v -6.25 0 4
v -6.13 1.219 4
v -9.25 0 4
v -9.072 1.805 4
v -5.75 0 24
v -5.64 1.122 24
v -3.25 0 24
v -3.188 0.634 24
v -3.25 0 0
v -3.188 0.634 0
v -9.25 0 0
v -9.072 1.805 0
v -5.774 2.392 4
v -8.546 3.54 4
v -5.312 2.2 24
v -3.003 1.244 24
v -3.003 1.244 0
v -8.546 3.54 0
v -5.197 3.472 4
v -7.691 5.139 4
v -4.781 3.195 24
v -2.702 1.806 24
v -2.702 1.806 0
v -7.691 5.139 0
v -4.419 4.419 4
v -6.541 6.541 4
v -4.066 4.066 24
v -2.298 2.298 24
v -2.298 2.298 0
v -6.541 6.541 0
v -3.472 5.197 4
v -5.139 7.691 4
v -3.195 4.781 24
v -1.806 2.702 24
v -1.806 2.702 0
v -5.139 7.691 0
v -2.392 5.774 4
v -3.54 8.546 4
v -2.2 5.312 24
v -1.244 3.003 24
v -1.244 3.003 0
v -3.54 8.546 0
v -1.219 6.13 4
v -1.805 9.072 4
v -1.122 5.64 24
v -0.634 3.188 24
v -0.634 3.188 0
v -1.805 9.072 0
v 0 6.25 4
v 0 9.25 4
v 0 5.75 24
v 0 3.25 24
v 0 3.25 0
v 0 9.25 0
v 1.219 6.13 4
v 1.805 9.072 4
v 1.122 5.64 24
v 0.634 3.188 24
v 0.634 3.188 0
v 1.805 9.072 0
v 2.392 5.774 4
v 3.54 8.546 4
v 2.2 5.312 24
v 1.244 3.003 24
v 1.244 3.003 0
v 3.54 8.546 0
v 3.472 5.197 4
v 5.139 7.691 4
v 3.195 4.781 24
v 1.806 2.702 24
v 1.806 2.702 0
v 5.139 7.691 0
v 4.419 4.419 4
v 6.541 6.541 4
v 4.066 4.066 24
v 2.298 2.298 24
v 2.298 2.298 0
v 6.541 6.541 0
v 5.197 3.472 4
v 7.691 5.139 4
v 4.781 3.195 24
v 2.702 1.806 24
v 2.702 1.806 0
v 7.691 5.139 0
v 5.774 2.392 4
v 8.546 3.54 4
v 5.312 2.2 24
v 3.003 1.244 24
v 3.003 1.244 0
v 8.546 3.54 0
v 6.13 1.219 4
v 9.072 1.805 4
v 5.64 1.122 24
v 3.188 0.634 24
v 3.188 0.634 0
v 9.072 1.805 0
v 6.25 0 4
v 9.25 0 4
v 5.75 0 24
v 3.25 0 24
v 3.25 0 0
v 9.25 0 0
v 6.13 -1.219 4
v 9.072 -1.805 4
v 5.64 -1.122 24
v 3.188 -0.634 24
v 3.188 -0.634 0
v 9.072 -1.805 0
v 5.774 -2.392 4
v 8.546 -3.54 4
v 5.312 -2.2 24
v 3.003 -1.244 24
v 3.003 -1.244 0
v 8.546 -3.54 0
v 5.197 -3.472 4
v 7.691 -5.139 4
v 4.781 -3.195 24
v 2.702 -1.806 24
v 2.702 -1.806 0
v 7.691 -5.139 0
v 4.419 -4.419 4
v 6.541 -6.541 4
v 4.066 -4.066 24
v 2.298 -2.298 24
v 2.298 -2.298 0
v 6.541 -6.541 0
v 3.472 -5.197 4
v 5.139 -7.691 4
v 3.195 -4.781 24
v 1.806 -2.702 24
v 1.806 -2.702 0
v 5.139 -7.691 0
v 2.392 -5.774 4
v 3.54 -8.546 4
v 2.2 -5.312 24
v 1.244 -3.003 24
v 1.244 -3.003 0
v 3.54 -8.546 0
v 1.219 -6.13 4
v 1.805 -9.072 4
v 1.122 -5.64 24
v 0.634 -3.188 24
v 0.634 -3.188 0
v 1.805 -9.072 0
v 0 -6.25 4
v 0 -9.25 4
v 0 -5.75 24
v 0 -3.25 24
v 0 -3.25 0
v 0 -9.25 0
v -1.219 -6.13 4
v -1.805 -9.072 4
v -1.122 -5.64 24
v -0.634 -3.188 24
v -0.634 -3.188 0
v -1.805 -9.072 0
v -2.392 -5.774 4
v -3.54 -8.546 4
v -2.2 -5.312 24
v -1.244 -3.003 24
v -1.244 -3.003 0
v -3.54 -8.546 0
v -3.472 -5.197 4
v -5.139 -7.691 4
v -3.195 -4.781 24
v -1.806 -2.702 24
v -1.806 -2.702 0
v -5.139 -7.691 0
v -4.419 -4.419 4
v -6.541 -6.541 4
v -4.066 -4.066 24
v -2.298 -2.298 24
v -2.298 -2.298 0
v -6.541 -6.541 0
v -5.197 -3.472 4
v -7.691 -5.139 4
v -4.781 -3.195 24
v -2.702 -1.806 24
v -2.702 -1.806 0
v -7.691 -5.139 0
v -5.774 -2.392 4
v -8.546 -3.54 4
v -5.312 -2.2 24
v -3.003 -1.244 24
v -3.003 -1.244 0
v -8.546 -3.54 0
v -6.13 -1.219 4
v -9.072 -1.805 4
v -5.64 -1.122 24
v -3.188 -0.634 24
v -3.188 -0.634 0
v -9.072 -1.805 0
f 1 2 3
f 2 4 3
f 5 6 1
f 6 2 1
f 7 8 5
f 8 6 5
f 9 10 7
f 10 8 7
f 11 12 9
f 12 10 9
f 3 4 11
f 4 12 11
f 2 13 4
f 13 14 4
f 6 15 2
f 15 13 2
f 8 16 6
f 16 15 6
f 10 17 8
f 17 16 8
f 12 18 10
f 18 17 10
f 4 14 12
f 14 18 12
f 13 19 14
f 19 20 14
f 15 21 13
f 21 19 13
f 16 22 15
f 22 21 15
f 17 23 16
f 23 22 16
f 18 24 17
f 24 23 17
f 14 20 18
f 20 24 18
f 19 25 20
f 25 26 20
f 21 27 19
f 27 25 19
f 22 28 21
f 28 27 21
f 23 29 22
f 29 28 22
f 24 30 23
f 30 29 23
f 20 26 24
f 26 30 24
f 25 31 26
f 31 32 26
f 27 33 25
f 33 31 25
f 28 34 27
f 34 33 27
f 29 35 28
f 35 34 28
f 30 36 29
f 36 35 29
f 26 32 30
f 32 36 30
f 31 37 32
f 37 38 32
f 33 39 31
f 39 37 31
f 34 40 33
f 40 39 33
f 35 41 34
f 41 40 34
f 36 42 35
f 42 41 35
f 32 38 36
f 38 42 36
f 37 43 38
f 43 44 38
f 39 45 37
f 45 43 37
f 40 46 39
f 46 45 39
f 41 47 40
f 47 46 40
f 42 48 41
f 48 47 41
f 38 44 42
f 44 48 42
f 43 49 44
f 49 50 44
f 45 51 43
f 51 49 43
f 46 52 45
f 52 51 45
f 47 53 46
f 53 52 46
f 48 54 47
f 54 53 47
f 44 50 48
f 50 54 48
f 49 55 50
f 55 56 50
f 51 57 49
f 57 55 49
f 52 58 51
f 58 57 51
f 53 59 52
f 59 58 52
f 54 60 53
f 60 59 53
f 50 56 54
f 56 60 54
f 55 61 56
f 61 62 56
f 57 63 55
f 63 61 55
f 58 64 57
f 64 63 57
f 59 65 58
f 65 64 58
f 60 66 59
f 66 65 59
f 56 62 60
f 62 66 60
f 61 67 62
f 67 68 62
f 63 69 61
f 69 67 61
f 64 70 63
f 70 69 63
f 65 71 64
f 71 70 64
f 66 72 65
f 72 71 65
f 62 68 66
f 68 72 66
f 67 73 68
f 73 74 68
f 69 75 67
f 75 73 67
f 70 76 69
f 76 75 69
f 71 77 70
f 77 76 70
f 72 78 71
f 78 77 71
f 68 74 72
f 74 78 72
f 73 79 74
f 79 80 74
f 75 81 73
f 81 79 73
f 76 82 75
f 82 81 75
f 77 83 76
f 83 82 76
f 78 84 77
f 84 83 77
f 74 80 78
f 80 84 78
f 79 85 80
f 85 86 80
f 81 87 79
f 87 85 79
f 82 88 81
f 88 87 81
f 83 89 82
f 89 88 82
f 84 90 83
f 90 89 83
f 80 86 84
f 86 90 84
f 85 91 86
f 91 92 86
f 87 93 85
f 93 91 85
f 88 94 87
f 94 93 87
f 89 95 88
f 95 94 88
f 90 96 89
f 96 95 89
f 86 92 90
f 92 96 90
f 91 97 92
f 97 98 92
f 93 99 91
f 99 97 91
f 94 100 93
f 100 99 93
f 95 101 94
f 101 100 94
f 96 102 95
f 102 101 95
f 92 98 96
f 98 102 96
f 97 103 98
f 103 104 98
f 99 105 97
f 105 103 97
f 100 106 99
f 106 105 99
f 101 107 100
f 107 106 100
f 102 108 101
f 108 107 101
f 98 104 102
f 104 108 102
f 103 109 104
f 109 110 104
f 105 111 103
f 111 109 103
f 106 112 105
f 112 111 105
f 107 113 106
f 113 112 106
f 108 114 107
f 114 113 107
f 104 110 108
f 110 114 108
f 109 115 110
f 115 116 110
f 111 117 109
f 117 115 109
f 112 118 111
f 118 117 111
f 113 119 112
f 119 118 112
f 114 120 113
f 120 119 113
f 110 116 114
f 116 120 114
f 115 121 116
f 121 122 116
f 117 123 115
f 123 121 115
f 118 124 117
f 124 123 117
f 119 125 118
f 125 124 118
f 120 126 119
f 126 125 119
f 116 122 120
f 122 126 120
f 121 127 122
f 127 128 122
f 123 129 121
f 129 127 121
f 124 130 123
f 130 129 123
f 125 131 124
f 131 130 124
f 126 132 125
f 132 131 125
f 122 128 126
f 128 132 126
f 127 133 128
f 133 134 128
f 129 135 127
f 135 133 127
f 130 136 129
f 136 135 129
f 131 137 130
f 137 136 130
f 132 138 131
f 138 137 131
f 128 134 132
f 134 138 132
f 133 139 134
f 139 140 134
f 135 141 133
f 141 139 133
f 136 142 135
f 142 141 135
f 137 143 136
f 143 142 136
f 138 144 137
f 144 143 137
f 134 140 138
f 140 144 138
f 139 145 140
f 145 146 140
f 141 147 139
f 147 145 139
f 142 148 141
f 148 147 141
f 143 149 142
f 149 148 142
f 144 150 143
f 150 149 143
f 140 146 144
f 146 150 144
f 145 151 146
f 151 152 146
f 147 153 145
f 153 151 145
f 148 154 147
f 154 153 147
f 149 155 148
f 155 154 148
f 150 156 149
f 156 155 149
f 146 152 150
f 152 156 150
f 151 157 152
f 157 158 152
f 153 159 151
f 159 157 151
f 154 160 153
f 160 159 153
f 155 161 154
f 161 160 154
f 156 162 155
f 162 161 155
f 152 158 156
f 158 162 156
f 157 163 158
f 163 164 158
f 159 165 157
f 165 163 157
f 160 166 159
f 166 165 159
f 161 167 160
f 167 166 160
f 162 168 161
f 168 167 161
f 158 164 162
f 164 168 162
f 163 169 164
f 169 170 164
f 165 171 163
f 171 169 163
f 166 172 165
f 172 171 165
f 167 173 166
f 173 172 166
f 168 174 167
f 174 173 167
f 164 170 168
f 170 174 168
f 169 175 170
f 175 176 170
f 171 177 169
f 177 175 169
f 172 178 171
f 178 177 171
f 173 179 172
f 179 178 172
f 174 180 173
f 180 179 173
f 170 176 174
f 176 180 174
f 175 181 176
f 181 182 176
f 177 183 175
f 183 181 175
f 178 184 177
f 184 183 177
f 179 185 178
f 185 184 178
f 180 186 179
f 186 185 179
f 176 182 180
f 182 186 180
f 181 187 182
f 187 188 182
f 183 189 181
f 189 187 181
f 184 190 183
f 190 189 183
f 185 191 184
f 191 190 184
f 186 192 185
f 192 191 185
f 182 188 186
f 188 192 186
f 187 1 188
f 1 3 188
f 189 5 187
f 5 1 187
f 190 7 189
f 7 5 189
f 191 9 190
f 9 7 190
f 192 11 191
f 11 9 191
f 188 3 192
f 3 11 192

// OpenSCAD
$fn = 32;

// ----------------------------------------------------------------------
// Profiled standoff: conical spacer, 24 mm long, bore 6.5 mm
// ----------------------------------------------------------------------

// --- parameters (mm) ---
revolve_angle = 360;      // full turn around the Z axis
profile_points = 6;       // points of the closed outline

profile = [[3.25, 0], [9.25, 0], [9.25, 4], [6.25, 4], [5.75, 24], [3.25, 24]];  // single closed polygon, 6 points, counter clockwise

// --- the one profile operation ---
rotate_extrude(angle = revolve_angle) polygon(points = profile);
